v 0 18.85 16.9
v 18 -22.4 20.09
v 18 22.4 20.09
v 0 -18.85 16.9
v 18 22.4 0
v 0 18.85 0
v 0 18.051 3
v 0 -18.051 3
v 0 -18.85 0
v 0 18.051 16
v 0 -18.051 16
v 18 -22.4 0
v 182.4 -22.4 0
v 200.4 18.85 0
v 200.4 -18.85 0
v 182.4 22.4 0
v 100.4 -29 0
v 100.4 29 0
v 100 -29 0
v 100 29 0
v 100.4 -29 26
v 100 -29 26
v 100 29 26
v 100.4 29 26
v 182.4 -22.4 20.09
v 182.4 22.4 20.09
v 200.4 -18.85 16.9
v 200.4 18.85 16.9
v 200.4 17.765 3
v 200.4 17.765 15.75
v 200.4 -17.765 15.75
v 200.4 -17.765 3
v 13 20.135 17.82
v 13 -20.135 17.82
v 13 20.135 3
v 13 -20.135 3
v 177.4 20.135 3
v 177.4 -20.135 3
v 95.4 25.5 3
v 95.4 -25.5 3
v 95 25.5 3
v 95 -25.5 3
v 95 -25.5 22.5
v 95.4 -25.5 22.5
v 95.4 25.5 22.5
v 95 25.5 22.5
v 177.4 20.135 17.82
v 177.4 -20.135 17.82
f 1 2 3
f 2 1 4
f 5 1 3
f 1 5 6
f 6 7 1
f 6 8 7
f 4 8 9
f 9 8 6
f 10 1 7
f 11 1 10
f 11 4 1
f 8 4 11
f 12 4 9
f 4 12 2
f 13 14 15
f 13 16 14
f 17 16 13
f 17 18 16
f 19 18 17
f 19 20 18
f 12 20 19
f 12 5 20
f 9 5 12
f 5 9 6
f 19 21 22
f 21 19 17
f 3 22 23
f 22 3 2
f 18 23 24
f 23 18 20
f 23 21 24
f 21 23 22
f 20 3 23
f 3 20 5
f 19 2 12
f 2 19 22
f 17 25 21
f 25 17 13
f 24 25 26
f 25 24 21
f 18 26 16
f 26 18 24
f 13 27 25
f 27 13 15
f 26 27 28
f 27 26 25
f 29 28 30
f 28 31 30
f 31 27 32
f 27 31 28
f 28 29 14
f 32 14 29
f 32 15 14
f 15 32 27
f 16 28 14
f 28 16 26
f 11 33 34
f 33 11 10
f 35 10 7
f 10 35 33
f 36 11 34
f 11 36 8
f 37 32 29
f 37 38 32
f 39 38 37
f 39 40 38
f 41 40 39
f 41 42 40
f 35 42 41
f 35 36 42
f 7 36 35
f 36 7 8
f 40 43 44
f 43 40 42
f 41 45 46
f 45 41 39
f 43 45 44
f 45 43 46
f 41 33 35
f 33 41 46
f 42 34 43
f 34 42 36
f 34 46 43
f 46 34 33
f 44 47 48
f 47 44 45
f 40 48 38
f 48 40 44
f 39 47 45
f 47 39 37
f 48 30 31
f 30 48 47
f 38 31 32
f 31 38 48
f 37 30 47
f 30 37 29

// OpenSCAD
$fn = 32;

// ----------------------------------------------------------------------
// Faired channel: 200 x 58 x 26 mm, 3.5 mm walls, faired ends
// ----------------------------------------------------------------------

// --- parameters (mm) ---
length = 200;             // channel length
width = 58;               // channel width at mid length
height = 26;              // channel height at mid length
wall = 3.5;               // side wall thickness
floor_t = 3;              // floor thickness
end_w = 37.7;             // faired end width
end_h = 16.9;             // faired end height

difference() {
  union() {
    hull() {
      translate([0, -18.85, 0]) cube([0.4, 37.7, 16.9]);
      translate([18, -22.4, 0]) cube([0.4, 44.8, 20.09]);
    }
    hull() {
      translate([18, -22.4, 0]) cube([0.4, 44.8, 20.09]);
      translate([100, -29, 0]) cube([0.4, 58, 26]);
    }
    hull() {
      translate([100, -29, 0]) cube([0.4, 58, 26]);
      translate([182, -22.4, 0]) cube([0.4, 44.8, 20.09]);
    }
    hull() {
      translate([182, -22.4, 0]) cube([0.4, 44.8, 20.09]);
      translate([200, -18.85, 0]) cube([0.4, 37.7, 16.9]);
    }
  }
  /* cavity, 5 mm proud of both ends so the ports are cut clean */
  hull() {
    translate([-5, -17.25, 3]) cube([0.4, 34.5, 12.3]);
    translate([13, -20.135, 3]) cube([0.4, 40.27, 14.82]);
  }
  hull() {
    translate([13, -20.135, 3]) cube([0.4, 40.27, 14.82]);
    translate([95, -25.5, 3]) cube([0.4, 51, 19.5]);
  }
  hull() {
    translate([95, -25.5, 3]) cube([0.4, 51, 19.5]);
    translate([177, -20.135, 3]) cube([0.4, 40.27, 14.82]);
  }
  hull() {
    translate([177, -20.135, 3]) cube([0.4, 40.27, 14.82]);
    translate([205, -17.25, 3]) cube([0.4, 34.5, 12.3]);
  }
}
